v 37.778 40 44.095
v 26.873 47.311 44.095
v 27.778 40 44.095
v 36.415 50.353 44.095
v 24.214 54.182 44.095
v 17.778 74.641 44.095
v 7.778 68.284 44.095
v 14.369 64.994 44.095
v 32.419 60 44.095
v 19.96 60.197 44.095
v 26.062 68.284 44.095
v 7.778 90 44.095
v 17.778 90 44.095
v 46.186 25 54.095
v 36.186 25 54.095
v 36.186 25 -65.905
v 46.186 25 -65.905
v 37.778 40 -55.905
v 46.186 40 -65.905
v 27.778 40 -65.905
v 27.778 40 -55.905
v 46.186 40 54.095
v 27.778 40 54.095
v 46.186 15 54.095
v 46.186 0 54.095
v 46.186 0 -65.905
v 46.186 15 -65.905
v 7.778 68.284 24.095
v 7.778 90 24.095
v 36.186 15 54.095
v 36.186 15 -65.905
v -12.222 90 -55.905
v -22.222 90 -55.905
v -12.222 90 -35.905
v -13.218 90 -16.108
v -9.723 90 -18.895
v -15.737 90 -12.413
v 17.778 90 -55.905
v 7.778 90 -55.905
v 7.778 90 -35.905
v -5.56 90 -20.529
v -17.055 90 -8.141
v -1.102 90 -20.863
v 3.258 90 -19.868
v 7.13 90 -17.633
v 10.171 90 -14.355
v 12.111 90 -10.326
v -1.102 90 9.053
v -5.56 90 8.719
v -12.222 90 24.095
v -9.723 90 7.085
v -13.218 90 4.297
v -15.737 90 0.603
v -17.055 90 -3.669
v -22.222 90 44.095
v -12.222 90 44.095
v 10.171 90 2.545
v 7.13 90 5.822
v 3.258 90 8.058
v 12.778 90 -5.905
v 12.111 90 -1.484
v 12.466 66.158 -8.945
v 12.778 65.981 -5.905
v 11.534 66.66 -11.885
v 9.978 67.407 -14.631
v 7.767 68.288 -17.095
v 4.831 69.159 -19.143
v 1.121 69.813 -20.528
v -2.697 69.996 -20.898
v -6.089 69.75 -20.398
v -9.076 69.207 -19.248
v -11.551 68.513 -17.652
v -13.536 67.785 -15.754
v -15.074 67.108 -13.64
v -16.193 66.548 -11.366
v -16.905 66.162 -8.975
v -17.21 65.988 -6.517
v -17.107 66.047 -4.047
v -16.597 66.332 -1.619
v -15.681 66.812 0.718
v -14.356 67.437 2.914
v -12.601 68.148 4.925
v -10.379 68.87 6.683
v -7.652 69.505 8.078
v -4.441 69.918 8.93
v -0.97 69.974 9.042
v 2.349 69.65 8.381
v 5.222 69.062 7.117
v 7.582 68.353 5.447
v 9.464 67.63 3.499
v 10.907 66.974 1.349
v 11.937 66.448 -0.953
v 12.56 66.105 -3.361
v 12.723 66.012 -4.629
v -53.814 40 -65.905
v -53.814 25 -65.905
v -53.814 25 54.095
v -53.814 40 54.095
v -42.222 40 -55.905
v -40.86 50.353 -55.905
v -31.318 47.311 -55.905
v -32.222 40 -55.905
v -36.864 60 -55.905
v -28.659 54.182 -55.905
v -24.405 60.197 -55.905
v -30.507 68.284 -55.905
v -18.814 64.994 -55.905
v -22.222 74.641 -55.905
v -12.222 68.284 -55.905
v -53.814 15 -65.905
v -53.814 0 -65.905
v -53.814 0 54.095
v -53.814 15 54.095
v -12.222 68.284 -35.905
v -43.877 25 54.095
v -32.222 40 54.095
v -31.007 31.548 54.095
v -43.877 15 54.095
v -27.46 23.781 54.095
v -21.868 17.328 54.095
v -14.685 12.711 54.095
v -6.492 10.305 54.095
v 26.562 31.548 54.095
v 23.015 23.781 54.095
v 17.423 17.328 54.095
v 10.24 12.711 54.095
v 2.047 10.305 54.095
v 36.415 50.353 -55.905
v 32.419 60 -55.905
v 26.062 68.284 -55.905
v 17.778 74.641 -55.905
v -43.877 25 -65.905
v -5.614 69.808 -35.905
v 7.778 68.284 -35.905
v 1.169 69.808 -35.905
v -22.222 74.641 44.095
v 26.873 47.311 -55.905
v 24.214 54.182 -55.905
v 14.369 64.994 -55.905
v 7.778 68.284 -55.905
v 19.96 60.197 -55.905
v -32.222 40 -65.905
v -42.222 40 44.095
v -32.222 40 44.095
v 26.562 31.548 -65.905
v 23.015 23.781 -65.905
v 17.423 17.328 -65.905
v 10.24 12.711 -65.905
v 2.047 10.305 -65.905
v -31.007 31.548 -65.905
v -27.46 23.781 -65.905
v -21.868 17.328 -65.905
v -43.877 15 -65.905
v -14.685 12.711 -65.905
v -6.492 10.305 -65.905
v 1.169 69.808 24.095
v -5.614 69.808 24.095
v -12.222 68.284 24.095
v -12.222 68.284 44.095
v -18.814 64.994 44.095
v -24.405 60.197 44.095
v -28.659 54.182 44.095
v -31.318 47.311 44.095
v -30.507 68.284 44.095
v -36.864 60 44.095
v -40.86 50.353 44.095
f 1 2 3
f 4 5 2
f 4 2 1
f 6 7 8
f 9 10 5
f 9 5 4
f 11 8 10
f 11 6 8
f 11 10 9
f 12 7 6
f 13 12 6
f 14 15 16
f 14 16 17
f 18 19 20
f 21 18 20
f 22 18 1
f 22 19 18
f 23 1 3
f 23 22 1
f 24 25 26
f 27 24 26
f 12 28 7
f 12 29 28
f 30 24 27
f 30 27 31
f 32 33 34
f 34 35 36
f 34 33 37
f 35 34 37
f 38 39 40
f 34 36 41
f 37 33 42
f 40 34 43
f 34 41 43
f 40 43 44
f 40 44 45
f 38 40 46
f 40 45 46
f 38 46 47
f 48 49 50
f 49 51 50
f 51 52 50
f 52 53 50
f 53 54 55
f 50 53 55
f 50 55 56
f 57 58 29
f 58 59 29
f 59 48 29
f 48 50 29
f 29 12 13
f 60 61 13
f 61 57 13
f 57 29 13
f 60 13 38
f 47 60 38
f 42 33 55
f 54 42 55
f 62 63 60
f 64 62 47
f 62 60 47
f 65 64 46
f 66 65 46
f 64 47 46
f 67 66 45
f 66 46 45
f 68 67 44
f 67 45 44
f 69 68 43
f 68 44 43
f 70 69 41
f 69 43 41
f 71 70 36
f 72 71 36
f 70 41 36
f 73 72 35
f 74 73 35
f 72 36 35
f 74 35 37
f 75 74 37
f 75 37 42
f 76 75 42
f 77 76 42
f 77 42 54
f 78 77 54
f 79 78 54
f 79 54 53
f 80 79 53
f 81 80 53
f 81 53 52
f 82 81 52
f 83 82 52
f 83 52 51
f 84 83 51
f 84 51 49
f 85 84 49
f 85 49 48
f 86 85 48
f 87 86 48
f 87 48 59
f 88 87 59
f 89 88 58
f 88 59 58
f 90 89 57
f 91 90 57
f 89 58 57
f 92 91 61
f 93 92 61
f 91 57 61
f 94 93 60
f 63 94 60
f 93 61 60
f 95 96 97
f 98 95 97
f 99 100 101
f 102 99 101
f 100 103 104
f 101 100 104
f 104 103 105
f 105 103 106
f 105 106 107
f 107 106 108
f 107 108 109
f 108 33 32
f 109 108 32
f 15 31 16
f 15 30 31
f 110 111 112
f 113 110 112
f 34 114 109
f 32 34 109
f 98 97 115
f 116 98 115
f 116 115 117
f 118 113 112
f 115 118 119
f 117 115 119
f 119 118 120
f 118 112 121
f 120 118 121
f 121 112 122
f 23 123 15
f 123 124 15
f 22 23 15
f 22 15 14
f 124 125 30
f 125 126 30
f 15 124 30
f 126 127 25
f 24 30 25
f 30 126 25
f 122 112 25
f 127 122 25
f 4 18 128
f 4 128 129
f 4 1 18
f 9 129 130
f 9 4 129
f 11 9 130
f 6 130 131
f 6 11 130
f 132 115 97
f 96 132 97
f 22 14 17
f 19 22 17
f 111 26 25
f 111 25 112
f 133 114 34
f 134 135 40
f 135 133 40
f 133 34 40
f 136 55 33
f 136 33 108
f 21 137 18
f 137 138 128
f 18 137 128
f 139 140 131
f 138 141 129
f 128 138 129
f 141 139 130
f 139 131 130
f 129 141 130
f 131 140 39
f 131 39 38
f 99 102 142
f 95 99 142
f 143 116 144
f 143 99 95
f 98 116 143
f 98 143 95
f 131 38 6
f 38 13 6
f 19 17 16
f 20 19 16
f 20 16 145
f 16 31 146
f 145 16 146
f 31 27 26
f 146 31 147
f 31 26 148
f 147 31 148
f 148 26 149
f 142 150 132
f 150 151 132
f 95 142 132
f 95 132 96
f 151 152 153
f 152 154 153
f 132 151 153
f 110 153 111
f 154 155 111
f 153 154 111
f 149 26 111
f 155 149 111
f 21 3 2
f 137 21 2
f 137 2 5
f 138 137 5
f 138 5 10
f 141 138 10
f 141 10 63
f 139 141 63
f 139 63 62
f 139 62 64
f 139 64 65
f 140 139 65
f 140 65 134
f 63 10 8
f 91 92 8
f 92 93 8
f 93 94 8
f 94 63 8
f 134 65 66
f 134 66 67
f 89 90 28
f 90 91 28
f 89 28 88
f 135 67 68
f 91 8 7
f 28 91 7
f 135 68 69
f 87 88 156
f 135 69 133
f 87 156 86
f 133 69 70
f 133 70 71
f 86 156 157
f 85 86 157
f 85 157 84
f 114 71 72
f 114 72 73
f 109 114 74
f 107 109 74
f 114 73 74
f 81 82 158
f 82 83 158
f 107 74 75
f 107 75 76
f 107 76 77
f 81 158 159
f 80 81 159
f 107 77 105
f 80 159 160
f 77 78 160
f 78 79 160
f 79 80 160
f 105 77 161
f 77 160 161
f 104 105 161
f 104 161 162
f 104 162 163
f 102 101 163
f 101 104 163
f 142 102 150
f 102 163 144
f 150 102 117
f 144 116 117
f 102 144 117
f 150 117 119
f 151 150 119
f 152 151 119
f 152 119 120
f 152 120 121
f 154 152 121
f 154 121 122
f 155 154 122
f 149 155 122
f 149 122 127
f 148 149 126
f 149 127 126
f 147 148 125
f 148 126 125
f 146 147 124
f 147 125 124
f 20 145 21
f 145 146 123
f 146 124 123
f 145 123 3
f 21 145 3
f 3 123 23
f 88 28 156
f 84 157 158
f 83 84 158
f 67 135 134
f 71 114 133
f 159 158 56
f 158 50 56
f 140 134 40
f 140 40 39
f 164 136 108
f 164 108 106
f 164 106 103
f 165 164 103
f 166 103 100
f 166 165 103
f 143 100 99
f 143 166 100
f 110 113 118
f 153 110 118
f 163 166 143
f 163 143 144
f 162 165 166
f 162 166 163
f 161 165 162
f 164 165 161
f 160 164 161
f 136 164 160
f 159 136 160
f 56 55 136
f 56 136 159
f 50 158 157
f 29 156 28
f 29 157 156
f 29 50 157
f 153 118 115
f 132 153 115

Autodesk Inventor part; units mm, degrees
ref_plane "YZ Plane" through (0, 0, 0) normal (1, 0, 0) x (0, 1, 0)
ref_plane "XZ Plane" through (0, 0, 0) normal (0, 1, 0) x (-1, 0, 0)
ref_plane "XY Plane" through (0, 0, 0) normal (0, 0, 1) x (1, 0, 0)
sketch "bottom" plane through (0, 0, 0) normal (0, 1, 0) x (-1, 0, 0)
  line L0 (53.8137, 54.0949) -> (-46.1863, 54.0949)
  line L1 (-46.1863, 54.0949) -> (-46.1863, -65.9051)
  line L2 (-46.1863, -65.9051) -> (53.8137, -65.9051)
  line L3 (53.8137, -65.9051) -> (53.8137, 54.0949)
  line L4 (102.7933, -5.9051) -> (-137.2052, -5.9051)
  point P0 (0, 0)
  point P1 (53.8137, -5.9051)
  dimension "d0" = 120
  dimension "d1" = 100
extrude "Выдавливание1" add sketch "bottom" along normal blind 40
sketch "tube" plane through (-53.8137, 0, 54.0949) normal (0, 0, 1) x (1, 0, 0)
  circle A0 centre (51.5912, 40) radius 30
  line L0 (51.5912, 113.4013) -> (51.5912, -34.7388)
  line L1 (0, 40) -> (100, 40) projected
  point P0 (53.8137, 0)
  dimension "d6" = 60
extrude "Углубление 1" cut sketch "tube" against normal blind 120
sketch "paz1" plane through (-53.8137, 0, 54.0949) normal (0, 0, 1) x (1, 0, 0)
  line L0 (0, 0) -> (100, 0) projected
  line L1 (-0.0635, 15) -> (9.9365, 15)
  line L2 (9.9365, 15) -> (9.9365, 25)
  line L3 (9.9365, 25) -> (-0.0635, 25)
  line L4 (-0.0635, 25) -> (-0.0635, 15)
  line L5 (0, 40) -> (21.5912, 40) projected
  line L6 (89.6996, 15) -> (99.6996, 15)
  line L7 (99.6996, 15) -> (99.6996, 25)
  line L8 (99.6996, 25) -> (89.6996, 25)
  line L9 (89.6996, 25) -> (89.6996, 15)
  point P0 (53.8137, 0)
  dimension "d11" = 10
  dimension "d12" = 10
  dimension "d13" = 15
  dimension "d14" = 15
  dimension "d15" = 40
  dimension "d16" = 10
  dimension "d17" = 10
  dimension "d18" = 15
extrude "Паз 1" cut sketch "paz1" against normal up to next contours L4 L3 L2 L1
sketch "paz2" plane through (-53.8137, 0, 54.0949) normal (0, 0, 1) x (1, 0, 0)
  line L0 (0, 0) -> (100, 0)
  line L1 (0, 15) -> (10, 15)
  line L2 (10, 15) -> (10, 25)
  line L3 (10, 25) -> (0, 25)
  line L4 (0, 25) -> (0, 15)
  line L5 (0, 40) -> (21.5912, 40)
  line L6 (50, 55.3447) -> (50, -18.8311)
  line L7 (100, 15) -> (90, 15)
  line L8 (90, 15) -> (90, 25)
  line L9 (90, 25) -> (100, 25)
  line L10 (100, 25) -> (100, 15)
  line L11 (-10.5586, 20) -> (107.965, 20)
  line L12 (100, 0) -> (100, 40) projected
  arc A0 (21.5912, 40) -> (81.5912, 40) centre (51.5912, 40) ccw projected
  line L13 (81.5912, 40) -> (100, 40)
  line L14 (100, 25) -> (100, 40)
  line L15 (100, 15) -> (100, 0)
  line L16 (0, 25) -> (0, 40) projected
  line L17 (0, 40) -> (0, 25)
  line L18 (0, 0) -> (100, 0) projected
  line L19 (0, 15) -> (0, 0)
  point P0 (53.8137, 0)
  point P1 (53.8137, 0)
  point P2 (50, 0)
  point P3 (100, 20)
  point P4 (100, 15)
  dimension "d21" = 10
  dimension "d22" = 10
  dimension "d23" = 15
  dimension "d24" = 15
  dimension "d25" = 40
ref_plane "фронт1" through (-53.8137, 0, 44.0949) normal (0, 0, 1) x (1, 0, 0)
ref_plane "фронт2" through (46.1863, 0, -55.9051) normal (0, 0, -1) x (-1, 0, 0)
sketch "front_arc" plane through (-53.8137, 0, 44.0949) normal (0, 0, 1) x (1, 0, 0)
  arc A0 (21.5912, 40) -> (81.5912, 40) centre (51.5912, 40) ccw projected
  arc A1 (81.5912, 40) -> (21.5912, 40) centre (51.5912, 40) ccw
  line L0 (0, 40) -> (21.5912, 40) projected
  line L1 (81.5912, 40) -> (100, 40) projected
  line L2 (11.5912, 40) -> (21.5912, 40)
  line L3 (81.5912, 40) -> (91.5912, 40)
  line L4 (31.5912, 90) -> (31.5912, 74.641)
  line L5 (31.5912, 90) -> (51.5912, 90)
  line L6 (51.5912, 105.7627) -> (51.5912, 37.5467)
  line L7 (71.5912, 90) -> (71.5912, 74.641)
  line L8 (71.5912, 90) -> (51.5912, 90)
  arc A2 (91.5912, 40) -> (71.5912, 74.641) centre (51.5912, 40) ccw
  arc A3 (31.5912, 74.641) -> (11.5912, 40) centre (51.5912, 40) ccw
  point P0 (53.8137, 0)
  point P1 (31.5912, 40)
  point P2 (31.5912, 62.3607)
  point P3 (71.5912, 62.3607)
  dimension "d75" = 50
  dimension "d76" = 20
  dimension "d77" = 20
  dimension "d92" = 50
extrude "Выдавливание9" add sketch "front_arc" against normal blind 100 contours L0 A3 L4 L5 L6 A1 | A1 L6 L8 L7 A2 L1
sketch "top" plane through (-22.2225, 90, 44.0949) normal (0, 1, 0) x (1, 0, 0)
  line L0 (40, 0) -> (0, 0) projected
  line L1 (40, 0) -> (40, 100) projected
  line L2 (0, 100) -> (40, 100) projected
  line L3 (0, 0) -> (0, 100) projected
  line L4 (10, 0) -> (30, 0)
  line L5 (-37.6485, 50) -> (83.4602, 50)
  circle A0 centre (20, 50) radius 15
  line L6 (0, 100) -> (40, 100) projected
  line L7 (10, 20) -> (10, 0)
  line L8 (40, 0) -> (0, 0) projected
  line L9 (10, 20) -> (30, 20)
  line L10 (30, 20) -> (30, 0)
  line L11 (10, 100) -> (30, 100)
  line L12 (10, 80) -> (10, 100)
  line L13 (10, 80) -> (30, 80)
  line L14 (30, 80) -> (30, 100)
  line L15 (20, -16.8031) -> (20, 112.4511)
  point P0 (22.2225, 44.0949)
  point P1 (20, 0)
  point P2 (20, 100)
  point P3 (20, 100)
  dimension "d81" = 30
  dimension "d83" = 20
  dimension "d84" = 20
  dimension "d87" = 20
extrude "Выдавливание10" cut sketch "top" against normal blind 30 contours L0 L15 L9 L10 | L0 L7 L9 L15 | L14 L13 L15 L2 | L15 L13 L12 L2
extrude "Выдавливание11" cut sketch "top" against normal blind 25 contours A0 L15 L5 | L5 L15 A0 | L15 A0 L5 | L5 A0 L15
extrude "Выдавливание12" cut sketch "paz2" against normal blind 120 contours L7 L8 L11 L10 | L11 L8 L9 L10
equation "\"Радиус_гибки\" = Толщина"
equation "\"Ширина_просечки\" = Толщина"
equation "\"Глубина_просечки\" = 0.5 * Толщина"
equation "\"Размер_просечки\" = 4 * Толщина"
equation "\"Мин_остаток\" = 2 * Толщина"
equation "\"Радиус_перехода\" = Радиус_гибки"
equation "\"Радиус_Якоби\" = Толщина"
equation "\"Размер_зазора\" = Толщина"
equation "\"Толщина\" = 0.5"
properties part number "lw_3_ползунок"
